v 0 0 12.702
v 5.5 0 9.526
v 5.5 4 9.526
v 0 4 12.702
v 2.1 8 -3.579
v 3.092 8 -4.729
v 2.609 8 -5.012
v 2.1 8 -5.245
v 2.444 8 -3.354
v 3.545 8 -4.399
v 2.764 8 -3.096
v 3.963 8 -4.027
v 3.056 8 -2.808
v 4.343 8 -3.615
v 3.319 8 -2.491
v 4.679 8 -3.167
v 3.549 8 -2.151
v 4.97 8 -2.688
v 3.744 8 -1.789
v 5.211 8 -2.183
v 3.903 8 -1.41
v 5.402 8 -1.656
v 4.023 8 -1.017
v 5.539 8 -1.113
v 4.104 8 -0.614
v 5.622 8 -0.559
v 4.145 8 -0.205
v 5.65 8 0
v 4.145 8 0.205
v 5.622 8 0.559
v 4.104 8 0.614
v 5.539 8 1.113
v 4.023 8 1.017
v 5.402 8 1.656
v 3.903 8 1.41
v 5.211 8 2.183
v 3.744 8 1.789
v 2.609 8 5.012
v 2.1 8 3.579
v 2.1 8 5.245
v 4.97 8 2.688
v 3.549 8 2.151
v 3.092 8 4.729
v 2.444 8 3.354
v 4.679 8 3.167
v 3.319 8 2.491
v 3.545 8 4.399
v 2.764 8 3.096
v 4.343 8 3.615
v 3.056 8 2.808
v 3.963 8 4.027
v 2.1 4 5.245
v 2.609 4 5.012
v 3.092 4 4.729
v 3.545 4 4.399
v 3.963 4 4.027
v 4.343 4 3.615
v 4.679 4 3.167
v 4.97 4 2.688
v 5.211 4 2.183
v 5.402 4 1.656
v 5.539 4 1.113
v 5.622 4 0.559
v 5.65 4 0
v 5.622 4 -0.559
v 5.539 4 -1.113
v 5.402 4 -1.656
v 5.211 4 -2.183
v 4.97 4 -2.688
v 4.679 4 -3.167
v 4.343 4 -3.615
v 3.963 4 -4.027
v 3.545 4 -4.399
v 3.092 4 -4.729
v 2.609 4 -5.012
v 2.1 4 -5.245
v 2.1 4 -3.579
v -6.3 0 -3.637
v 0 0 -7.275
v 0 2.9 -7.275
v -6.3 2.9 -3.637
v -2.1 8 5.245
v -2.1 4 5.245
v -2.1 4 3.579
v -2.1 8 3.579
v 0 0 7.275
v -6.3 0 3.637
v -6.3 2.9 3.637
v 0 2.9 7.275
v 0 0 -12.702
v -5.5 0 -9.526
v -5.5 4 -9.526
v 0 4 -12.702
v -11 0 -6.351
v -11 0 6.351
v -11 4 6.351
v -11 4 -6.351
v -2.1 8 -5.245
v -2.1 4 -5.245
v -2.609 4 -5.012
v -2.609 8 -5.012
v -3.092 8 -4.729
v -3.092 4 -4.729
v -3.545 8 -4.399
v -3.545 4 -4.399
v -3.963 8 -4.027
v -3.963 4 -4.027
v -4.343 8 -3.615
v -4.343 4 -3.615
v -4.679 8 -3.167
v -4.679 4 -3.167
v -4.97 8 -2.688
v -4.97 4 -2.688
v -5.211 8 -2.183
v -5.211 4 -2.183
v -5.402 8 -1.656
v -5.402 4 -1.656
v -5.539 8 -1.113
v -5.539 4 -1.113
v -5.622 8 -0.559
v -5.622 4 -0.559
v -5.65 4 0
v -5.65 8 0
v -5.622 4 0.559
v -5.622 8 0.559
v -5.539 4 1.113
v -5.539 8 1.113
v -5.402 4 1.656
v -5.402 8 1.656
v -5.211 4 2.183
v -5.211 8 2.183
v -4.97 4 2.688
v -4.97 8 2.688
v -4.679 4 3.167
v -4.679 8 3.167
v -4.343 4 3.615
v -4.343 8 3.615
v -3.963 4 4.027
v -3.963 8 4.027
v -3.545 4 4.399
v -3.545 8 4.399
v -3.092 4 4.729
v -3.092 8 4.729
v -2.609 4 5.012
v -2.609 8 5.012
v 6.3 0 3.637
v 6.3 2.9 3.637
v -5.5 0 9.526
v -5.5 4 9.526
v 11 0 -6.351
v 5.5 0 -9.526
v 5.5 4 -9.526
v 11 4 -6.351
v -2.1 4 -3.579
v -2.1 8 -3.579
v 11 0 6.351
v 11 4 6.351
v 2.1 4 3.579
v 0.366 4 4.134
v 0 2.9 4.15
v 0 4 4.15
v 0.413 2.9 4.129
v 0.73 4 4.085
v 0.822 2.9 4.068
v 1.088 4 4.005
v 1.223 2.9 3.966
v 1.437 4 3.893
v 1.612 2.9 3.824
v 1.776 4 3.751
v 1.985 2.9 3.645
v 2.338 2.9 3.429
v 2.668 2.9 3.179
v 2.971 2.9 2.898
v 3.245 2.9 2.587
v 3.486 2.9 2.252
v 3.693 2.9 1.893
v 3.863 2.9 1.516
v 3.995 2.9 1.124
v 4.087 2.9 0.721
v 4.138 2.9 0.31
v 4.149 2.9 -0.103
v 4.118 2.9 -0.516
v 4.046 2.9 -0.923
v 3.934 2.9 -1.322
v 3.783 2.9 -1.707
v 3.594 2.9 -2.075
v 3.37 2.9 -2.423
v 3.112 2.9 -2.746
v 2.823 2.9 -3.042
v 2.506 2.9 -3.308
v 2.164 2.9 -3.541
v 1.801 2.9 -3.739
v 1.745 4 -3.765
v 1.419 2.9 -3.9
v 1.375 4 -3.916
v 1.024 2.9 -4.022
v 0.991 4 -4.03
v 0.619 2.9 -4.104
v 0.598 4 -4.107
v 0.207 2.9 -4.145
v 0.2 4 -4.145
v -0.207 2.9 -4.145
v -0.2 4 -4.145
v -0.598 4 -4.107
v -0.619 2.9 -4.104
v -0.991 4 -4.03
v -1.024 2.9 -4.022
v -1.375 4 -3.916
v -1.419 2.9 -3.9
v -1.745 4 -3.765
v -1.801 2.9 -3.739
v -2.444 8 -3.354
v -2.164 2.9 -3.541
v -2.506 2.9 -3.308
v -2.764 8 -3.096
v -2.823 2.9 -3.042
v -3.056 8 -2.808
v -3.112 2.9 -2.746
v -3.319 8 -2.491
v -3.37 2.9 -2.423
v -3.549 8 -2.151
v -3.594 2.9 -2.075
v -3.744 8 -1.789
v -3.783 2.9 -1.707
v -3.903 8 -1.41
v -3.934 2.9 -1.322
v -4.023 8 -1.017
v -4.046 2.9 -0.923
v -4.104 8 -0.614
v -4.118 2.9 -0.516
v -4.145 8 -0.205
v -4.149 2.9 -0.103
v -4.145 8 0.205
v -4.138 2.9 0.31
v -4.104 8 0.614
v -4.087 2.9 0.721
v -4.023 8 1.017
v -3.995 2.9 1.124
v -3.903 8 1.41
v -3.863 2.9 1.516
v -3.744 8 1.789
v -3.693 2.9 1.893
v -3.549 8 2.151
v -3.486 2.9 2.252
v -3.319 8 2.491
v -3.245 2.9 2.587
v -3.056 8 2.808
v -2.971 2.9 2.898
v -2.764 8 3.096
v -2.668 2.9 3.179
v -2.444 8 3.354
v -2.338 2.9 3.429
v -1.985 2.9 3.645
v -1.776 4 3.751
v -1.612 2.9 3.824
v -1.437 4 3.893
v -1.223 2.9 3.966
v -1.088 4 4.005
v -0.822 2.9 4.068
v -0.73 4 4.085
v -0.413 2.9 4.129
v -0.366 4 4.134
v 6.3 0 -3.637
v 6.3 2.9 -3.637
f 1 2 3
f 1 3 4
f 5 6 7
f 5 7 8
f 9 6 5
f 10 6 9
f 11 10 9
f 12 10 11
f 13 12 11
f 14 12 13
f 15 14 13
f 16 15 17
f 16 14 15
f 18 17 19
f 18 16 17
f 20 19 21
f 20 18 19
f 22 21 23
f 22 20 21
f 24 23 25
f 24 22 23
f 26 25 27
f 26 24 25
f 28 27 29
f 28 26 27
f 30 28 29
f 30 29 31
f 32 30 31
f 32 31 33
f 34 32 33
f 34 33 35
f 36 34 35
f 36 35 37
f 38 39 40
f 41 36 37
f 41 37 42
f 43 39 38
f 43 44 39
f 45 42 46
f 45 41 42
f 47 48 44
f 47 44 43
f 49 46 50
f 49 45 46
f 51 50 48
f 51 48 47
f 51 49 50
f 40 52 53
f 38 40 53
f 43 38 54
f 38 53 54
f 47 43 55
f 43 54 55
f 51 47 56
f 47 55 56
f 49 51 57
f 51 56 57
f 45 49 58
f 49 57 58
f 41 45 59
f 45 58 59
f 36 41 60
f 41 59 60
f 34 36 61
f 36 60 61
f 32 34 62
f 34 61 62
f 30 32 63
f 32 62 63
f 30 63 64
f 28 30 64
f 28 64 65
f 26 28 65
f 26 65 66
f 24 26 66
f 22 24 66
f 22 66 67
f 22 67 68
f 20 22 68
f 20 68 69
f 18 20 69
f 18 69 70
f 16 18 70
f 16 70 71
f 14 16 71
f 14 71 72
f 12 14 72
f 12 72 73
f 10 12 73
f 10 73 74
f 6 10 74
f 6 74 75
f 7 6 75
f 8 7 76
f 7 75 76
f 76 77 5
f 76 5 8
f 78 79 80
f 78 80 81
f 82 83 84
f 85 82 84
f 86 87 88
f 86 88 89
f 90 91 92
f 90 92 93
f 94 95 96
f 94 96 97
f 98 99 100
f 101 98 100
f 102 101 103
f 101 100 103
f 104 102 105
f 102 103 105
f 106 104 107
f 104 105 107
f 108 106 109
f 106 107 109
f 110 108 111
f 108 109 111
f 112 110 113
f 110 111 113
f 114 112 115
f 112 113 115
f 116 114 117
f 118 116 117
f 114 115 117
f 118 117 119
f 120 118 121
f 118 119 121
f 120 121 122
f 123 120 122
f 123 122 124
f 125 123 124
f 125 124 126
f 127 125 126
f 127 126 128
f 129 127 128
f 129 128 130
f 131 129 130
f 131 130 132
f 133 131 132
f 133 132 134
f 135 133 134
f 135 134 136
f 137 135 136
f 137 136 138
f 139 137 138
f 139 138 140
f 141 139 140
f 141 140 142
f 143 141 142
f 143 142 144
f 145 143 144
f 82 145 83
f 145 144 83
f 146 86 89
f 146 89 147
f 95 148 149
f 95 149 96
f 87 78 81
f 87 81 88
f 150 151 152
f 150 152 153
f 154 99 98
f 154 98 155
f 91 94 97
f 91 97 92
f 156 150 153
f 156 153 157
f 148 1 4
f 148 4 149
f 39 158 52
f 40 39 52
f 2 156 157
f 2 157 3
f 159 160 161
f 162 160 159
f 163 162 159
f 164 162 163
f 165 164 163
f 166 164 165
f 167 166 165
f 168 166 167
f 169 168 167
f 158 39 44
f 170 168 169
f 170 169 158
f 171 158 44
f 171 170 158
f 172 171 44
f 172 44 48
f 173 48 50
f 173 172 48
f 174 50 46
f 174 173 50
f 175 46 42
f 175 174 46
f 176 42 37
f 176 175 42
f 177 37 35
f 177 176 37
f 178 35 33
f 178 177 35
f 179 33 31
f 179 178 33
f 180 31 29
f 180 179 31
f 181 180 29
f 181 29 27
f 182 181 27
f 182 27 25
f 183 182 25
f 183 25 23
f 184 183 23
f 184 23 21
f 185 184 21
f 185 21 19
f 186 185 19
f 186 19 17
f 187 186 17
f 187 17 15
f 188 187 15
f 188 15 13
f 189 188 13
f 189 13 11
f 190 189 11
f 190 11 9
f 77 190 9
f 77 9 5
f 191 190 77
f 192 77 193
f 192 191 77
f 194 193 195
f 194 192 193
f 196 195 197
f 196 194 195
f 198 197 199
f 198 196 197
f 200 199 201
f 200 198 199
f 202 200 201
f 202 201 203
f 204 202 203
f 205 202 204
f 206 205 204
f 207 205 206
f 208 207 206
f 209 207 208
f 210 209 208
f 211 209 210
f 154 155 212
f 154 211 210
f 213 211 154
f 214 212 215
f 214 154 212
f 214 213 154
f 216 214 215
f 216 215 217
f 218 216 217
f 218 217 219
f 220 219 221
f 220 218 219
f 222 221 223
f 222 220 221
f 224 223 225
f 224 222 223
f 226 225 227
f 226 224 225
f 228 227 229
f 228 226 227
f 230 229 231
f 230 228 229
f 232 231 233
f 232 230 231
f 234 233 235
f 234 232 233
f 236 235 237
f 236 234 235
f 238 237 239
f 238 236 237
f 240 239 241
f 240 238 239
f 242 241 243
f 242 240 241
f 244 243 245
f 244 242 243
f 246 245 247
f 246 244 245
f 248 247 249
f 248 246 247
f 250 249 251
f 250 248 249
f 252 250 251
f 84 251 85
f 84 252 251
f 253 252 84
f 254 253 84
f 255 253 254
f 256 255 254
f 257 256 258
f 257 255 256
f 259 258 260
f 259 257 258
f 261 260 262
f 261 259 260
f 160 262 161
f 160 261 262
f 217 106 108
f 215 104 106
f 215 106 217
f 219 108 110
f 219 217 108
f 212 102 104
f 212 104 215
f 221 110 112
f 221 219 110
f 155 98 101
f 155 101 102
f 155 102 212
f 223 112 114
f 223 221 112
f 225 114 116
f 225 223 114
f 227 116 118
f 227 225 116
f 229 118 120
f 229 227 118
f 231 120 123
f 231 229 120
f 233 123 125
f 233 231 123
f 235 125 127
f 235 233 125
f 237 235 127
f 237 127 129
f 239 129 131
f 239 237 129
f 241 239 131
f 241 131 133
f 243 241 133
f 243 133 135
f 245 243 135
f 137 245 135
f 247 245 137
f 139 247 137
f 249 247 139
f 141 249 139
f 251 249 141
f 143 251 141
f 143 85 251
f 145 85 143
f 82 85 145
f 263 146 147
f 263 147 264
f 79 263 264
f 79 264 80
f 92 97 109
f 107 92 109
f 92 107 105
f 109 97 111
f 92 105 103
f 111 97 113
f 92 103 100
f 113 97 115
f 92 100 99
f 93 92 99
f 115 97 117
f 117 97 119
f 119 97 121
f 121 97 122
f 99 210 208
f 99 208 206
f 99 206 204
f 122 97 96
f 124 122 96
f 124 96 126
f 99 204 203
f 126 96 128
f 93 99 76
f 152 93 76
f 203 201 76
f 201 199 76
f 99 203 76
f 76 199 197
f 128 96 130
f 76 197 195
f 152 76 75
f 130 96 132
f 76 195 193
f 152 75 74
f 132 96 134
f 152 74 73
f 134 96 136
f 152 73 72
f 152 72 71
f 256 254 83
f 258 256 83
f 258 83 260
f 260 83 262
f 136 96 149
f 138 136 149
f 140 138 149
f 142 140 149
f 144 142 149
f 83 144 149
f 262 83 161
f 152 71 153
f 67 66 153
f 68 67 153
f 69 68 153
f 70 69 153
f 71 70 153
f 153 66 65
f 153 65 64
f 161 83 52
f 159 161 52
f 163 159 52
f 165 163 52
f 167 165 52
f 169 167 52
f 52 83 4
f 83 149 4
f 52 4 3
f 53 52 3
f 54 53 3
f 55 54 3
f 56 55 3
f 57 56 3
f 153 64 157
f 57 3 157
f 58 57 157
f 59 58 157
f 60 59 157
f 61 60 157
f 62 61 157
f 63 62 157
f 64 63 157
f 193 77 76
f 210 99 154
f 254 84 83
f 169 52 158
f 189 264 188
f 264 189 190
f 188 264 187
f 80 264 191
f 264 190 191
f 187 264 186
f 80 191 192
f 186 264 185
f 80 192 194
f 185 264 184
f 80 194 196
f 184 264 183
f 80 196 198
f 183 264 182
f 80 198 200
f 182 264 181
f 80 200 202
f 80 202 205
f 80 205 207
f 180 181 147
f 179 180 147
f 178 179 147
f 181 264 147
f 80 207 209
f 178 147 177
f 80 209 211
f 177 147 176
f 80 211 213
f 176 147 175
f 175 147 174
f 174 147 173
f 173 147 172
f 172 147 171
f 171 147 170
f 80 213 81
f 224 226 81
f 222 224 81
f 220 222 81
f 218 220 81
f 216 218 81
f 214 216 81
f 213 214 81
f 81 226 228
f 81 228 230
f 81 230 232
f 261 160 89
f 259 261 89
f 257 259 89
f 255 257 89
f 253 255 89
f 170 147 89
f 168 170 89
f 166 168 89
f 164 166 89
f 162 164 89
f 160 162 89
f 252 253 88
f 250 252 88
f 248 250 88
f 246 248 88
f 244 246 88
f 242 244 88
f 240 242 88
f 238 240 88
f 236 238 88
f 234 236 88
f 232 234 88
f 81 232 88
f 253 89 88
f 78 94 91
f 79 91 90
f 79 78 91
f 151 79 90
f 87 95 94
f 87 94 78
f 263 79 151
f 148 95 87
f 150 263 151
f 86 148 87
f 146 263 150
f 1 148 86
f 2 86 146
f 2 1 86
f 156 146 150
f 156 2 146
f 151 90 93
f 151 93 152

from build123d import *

# Parameters (mm, degrees)
SKETCH_1_R          = 5.65
SKETCH_1_R_2        = 4.15
EXTRUDE_1_DEPTH     = 8
SKETCH_1_3_R        = 11
SKETCH_1_3_R_2      = 5.65
EXTRUDE_2_DEPTH     = 4
CUT_EXTRUDE_1_DEPTH = 2.9
CUT_EXTRUDE_START   = -4
CUT_EXTRUDE_3_DEPTH = 4
EXTRUDE_4_DEPTH     = 4


with BuildPart() as part:
    # 草图1 → 凸台-拉伸1 (new body)
    with BuildSketch(Plane(origin=(0, 0, 0), x_dir=(1, 0, 0), z_dir=(0, 1, 0))):
        with Locations(Location((0, 0, 0), (0, 0, 270))):
            Circle(SKETCH_1_R)
        with Locations(Location((0, 0, 0), (0, 0, 270))):
            Circle(SKETCH_1_R_2, mode=Mode.SUBTRACT)
    extrude(amount=EXTRUDE_1_DEPTH)

    # 草图1<3> → 凸台-拉伸2 (add)
    with BuildSketch(Plane(origin=(0, 0, 0), x_dir=(1, 0, 0), z_dir=(0, 1, 0))):
        with Locations(Location((0, 0, 0), (0, 0, 270))):
            Circle(SKETCH_1_3_R)
        with Locations(Location((0, 0, 0), (0, 0, 270))):
            Circle(SKETCH_1_3_R_2, mode=Mode.SUBTRACT)
    extrude(amount=EXTRUDE_2_DEPTH)

    # 草图2 → 切除-拉伸1 (cut)
    with BuildSketch(Plane.XZ):
        Polygon((0, -7.274613392), (-6.3, -3.637306696), (-6.3, 3.637306696), (0, 7.274613392), (6.3, 3.637306696), (6.3, -3.637306696), align=None)
    extrude(amount=-CUT_EXTRUDE_1_DEPTH, mode=Mode.SUBTRACT)

    # 草图4 → 切除-拉伸3 (cut)
    with BuildSketch(Plane(origin=(0, 8, 0), x_dir=(1, 0, 0), z_dir=(0, 1, 0)).offset(CUT_EXTRUDE_START)):
        with BuildLine():
            Line((-2.1, 5.245235934), (-2.1, 3.579455266))
            ThreePointArc((-2.1, 3.579455266), (0, 4.15), (2.1, 3.579455266))
            Line((2.1, 3.579455266), (2.1, 5.245235934))
            ThreePointArc((2.1, 5.245235934), (0, 5.65), (-2.1, 5.245235934))
        make_face()
        with BuildLine():
            Line((2.1, -3.579455266), (2.1, -5.245235934))
            ThreePointArc((2.1, -5.245235934), (0, -5.65), (-2.1, -5.245235934))
            Line((-2.1, -5.245235934), (-2.1, -3.579455266))
            ThreePointArc((-2.1, -3.579455266), (0, -4.15), (2.1, -3.579455266))
        make_face()
    extrude(amount=CUT_EXTRUDE_3_DEPTH, mode=Mode.SUBTRACT)

    # 草图6 → 凸台-拉伸4 (add)
    with BuildSketch(Plane.XZ):
        with BuildLine():
            Line((5.500000491, -9.526279158), (11, -6.350852961))
            Line((11, -6.350852961), (11, 0))
            ThreePointArc((11, 0), (9.526279583, -5.499999755), (5.500000491, -9.526279158))
        make_face()
        with BuildLine():
            Line((0, -12.701705922), (5.500000491, -9.526279158))
            ThreePointArc((5.500000491, -9.526279158), (2.1e-08, -11), (-5.500000453, -9.52627918))
            Line((-5.500000453, -9.52627918), (0, -12.701705922))
        make_face()
        with BuildLine():
            Line((-11, -6.350852961), (-5.500000453, -9.52627918))
            ThreePointArc((-5.500000453, -9.52627918), (-9.526279573, -5.499999773), (-11, 0))
            Line((-11, 0), (-11, -6.350852961))
        make_face()
        with BuildLine():
            ThreePointArc((-11, 0), (-9.526279572, 5.499999775), (-5.50000045, 9.526279182))
            Line((-5.50000045, 9.526279182), (-11, 6.350852961))
            Line((-11, 6.350852961), (-11, 0))
        make_face()
        with BuildLine():
            ThreePointArc((-5.50000045, 9.526279182), (9.6e-08, 11), (5.500000616, 9.526279086))
            Line((5.500000616, 9.526279086), (0, 12.701705922))
            Line((0, 12.701705922), (-5.50000045, 9.526279182))
        make_face()
        with BuildLine():
            ThreePointArc((5.500000616, 9.526279086), (9.526279619, 5.499999692), (11, 0))
            Line((11, 0), (11, 6.350852961))
            Line((11, 6.350852961), (5.500000616, 9.526279086))
        make_face()
    extrude(amount=-EXTRUDE_4_DEPTH)


solid = part.part
